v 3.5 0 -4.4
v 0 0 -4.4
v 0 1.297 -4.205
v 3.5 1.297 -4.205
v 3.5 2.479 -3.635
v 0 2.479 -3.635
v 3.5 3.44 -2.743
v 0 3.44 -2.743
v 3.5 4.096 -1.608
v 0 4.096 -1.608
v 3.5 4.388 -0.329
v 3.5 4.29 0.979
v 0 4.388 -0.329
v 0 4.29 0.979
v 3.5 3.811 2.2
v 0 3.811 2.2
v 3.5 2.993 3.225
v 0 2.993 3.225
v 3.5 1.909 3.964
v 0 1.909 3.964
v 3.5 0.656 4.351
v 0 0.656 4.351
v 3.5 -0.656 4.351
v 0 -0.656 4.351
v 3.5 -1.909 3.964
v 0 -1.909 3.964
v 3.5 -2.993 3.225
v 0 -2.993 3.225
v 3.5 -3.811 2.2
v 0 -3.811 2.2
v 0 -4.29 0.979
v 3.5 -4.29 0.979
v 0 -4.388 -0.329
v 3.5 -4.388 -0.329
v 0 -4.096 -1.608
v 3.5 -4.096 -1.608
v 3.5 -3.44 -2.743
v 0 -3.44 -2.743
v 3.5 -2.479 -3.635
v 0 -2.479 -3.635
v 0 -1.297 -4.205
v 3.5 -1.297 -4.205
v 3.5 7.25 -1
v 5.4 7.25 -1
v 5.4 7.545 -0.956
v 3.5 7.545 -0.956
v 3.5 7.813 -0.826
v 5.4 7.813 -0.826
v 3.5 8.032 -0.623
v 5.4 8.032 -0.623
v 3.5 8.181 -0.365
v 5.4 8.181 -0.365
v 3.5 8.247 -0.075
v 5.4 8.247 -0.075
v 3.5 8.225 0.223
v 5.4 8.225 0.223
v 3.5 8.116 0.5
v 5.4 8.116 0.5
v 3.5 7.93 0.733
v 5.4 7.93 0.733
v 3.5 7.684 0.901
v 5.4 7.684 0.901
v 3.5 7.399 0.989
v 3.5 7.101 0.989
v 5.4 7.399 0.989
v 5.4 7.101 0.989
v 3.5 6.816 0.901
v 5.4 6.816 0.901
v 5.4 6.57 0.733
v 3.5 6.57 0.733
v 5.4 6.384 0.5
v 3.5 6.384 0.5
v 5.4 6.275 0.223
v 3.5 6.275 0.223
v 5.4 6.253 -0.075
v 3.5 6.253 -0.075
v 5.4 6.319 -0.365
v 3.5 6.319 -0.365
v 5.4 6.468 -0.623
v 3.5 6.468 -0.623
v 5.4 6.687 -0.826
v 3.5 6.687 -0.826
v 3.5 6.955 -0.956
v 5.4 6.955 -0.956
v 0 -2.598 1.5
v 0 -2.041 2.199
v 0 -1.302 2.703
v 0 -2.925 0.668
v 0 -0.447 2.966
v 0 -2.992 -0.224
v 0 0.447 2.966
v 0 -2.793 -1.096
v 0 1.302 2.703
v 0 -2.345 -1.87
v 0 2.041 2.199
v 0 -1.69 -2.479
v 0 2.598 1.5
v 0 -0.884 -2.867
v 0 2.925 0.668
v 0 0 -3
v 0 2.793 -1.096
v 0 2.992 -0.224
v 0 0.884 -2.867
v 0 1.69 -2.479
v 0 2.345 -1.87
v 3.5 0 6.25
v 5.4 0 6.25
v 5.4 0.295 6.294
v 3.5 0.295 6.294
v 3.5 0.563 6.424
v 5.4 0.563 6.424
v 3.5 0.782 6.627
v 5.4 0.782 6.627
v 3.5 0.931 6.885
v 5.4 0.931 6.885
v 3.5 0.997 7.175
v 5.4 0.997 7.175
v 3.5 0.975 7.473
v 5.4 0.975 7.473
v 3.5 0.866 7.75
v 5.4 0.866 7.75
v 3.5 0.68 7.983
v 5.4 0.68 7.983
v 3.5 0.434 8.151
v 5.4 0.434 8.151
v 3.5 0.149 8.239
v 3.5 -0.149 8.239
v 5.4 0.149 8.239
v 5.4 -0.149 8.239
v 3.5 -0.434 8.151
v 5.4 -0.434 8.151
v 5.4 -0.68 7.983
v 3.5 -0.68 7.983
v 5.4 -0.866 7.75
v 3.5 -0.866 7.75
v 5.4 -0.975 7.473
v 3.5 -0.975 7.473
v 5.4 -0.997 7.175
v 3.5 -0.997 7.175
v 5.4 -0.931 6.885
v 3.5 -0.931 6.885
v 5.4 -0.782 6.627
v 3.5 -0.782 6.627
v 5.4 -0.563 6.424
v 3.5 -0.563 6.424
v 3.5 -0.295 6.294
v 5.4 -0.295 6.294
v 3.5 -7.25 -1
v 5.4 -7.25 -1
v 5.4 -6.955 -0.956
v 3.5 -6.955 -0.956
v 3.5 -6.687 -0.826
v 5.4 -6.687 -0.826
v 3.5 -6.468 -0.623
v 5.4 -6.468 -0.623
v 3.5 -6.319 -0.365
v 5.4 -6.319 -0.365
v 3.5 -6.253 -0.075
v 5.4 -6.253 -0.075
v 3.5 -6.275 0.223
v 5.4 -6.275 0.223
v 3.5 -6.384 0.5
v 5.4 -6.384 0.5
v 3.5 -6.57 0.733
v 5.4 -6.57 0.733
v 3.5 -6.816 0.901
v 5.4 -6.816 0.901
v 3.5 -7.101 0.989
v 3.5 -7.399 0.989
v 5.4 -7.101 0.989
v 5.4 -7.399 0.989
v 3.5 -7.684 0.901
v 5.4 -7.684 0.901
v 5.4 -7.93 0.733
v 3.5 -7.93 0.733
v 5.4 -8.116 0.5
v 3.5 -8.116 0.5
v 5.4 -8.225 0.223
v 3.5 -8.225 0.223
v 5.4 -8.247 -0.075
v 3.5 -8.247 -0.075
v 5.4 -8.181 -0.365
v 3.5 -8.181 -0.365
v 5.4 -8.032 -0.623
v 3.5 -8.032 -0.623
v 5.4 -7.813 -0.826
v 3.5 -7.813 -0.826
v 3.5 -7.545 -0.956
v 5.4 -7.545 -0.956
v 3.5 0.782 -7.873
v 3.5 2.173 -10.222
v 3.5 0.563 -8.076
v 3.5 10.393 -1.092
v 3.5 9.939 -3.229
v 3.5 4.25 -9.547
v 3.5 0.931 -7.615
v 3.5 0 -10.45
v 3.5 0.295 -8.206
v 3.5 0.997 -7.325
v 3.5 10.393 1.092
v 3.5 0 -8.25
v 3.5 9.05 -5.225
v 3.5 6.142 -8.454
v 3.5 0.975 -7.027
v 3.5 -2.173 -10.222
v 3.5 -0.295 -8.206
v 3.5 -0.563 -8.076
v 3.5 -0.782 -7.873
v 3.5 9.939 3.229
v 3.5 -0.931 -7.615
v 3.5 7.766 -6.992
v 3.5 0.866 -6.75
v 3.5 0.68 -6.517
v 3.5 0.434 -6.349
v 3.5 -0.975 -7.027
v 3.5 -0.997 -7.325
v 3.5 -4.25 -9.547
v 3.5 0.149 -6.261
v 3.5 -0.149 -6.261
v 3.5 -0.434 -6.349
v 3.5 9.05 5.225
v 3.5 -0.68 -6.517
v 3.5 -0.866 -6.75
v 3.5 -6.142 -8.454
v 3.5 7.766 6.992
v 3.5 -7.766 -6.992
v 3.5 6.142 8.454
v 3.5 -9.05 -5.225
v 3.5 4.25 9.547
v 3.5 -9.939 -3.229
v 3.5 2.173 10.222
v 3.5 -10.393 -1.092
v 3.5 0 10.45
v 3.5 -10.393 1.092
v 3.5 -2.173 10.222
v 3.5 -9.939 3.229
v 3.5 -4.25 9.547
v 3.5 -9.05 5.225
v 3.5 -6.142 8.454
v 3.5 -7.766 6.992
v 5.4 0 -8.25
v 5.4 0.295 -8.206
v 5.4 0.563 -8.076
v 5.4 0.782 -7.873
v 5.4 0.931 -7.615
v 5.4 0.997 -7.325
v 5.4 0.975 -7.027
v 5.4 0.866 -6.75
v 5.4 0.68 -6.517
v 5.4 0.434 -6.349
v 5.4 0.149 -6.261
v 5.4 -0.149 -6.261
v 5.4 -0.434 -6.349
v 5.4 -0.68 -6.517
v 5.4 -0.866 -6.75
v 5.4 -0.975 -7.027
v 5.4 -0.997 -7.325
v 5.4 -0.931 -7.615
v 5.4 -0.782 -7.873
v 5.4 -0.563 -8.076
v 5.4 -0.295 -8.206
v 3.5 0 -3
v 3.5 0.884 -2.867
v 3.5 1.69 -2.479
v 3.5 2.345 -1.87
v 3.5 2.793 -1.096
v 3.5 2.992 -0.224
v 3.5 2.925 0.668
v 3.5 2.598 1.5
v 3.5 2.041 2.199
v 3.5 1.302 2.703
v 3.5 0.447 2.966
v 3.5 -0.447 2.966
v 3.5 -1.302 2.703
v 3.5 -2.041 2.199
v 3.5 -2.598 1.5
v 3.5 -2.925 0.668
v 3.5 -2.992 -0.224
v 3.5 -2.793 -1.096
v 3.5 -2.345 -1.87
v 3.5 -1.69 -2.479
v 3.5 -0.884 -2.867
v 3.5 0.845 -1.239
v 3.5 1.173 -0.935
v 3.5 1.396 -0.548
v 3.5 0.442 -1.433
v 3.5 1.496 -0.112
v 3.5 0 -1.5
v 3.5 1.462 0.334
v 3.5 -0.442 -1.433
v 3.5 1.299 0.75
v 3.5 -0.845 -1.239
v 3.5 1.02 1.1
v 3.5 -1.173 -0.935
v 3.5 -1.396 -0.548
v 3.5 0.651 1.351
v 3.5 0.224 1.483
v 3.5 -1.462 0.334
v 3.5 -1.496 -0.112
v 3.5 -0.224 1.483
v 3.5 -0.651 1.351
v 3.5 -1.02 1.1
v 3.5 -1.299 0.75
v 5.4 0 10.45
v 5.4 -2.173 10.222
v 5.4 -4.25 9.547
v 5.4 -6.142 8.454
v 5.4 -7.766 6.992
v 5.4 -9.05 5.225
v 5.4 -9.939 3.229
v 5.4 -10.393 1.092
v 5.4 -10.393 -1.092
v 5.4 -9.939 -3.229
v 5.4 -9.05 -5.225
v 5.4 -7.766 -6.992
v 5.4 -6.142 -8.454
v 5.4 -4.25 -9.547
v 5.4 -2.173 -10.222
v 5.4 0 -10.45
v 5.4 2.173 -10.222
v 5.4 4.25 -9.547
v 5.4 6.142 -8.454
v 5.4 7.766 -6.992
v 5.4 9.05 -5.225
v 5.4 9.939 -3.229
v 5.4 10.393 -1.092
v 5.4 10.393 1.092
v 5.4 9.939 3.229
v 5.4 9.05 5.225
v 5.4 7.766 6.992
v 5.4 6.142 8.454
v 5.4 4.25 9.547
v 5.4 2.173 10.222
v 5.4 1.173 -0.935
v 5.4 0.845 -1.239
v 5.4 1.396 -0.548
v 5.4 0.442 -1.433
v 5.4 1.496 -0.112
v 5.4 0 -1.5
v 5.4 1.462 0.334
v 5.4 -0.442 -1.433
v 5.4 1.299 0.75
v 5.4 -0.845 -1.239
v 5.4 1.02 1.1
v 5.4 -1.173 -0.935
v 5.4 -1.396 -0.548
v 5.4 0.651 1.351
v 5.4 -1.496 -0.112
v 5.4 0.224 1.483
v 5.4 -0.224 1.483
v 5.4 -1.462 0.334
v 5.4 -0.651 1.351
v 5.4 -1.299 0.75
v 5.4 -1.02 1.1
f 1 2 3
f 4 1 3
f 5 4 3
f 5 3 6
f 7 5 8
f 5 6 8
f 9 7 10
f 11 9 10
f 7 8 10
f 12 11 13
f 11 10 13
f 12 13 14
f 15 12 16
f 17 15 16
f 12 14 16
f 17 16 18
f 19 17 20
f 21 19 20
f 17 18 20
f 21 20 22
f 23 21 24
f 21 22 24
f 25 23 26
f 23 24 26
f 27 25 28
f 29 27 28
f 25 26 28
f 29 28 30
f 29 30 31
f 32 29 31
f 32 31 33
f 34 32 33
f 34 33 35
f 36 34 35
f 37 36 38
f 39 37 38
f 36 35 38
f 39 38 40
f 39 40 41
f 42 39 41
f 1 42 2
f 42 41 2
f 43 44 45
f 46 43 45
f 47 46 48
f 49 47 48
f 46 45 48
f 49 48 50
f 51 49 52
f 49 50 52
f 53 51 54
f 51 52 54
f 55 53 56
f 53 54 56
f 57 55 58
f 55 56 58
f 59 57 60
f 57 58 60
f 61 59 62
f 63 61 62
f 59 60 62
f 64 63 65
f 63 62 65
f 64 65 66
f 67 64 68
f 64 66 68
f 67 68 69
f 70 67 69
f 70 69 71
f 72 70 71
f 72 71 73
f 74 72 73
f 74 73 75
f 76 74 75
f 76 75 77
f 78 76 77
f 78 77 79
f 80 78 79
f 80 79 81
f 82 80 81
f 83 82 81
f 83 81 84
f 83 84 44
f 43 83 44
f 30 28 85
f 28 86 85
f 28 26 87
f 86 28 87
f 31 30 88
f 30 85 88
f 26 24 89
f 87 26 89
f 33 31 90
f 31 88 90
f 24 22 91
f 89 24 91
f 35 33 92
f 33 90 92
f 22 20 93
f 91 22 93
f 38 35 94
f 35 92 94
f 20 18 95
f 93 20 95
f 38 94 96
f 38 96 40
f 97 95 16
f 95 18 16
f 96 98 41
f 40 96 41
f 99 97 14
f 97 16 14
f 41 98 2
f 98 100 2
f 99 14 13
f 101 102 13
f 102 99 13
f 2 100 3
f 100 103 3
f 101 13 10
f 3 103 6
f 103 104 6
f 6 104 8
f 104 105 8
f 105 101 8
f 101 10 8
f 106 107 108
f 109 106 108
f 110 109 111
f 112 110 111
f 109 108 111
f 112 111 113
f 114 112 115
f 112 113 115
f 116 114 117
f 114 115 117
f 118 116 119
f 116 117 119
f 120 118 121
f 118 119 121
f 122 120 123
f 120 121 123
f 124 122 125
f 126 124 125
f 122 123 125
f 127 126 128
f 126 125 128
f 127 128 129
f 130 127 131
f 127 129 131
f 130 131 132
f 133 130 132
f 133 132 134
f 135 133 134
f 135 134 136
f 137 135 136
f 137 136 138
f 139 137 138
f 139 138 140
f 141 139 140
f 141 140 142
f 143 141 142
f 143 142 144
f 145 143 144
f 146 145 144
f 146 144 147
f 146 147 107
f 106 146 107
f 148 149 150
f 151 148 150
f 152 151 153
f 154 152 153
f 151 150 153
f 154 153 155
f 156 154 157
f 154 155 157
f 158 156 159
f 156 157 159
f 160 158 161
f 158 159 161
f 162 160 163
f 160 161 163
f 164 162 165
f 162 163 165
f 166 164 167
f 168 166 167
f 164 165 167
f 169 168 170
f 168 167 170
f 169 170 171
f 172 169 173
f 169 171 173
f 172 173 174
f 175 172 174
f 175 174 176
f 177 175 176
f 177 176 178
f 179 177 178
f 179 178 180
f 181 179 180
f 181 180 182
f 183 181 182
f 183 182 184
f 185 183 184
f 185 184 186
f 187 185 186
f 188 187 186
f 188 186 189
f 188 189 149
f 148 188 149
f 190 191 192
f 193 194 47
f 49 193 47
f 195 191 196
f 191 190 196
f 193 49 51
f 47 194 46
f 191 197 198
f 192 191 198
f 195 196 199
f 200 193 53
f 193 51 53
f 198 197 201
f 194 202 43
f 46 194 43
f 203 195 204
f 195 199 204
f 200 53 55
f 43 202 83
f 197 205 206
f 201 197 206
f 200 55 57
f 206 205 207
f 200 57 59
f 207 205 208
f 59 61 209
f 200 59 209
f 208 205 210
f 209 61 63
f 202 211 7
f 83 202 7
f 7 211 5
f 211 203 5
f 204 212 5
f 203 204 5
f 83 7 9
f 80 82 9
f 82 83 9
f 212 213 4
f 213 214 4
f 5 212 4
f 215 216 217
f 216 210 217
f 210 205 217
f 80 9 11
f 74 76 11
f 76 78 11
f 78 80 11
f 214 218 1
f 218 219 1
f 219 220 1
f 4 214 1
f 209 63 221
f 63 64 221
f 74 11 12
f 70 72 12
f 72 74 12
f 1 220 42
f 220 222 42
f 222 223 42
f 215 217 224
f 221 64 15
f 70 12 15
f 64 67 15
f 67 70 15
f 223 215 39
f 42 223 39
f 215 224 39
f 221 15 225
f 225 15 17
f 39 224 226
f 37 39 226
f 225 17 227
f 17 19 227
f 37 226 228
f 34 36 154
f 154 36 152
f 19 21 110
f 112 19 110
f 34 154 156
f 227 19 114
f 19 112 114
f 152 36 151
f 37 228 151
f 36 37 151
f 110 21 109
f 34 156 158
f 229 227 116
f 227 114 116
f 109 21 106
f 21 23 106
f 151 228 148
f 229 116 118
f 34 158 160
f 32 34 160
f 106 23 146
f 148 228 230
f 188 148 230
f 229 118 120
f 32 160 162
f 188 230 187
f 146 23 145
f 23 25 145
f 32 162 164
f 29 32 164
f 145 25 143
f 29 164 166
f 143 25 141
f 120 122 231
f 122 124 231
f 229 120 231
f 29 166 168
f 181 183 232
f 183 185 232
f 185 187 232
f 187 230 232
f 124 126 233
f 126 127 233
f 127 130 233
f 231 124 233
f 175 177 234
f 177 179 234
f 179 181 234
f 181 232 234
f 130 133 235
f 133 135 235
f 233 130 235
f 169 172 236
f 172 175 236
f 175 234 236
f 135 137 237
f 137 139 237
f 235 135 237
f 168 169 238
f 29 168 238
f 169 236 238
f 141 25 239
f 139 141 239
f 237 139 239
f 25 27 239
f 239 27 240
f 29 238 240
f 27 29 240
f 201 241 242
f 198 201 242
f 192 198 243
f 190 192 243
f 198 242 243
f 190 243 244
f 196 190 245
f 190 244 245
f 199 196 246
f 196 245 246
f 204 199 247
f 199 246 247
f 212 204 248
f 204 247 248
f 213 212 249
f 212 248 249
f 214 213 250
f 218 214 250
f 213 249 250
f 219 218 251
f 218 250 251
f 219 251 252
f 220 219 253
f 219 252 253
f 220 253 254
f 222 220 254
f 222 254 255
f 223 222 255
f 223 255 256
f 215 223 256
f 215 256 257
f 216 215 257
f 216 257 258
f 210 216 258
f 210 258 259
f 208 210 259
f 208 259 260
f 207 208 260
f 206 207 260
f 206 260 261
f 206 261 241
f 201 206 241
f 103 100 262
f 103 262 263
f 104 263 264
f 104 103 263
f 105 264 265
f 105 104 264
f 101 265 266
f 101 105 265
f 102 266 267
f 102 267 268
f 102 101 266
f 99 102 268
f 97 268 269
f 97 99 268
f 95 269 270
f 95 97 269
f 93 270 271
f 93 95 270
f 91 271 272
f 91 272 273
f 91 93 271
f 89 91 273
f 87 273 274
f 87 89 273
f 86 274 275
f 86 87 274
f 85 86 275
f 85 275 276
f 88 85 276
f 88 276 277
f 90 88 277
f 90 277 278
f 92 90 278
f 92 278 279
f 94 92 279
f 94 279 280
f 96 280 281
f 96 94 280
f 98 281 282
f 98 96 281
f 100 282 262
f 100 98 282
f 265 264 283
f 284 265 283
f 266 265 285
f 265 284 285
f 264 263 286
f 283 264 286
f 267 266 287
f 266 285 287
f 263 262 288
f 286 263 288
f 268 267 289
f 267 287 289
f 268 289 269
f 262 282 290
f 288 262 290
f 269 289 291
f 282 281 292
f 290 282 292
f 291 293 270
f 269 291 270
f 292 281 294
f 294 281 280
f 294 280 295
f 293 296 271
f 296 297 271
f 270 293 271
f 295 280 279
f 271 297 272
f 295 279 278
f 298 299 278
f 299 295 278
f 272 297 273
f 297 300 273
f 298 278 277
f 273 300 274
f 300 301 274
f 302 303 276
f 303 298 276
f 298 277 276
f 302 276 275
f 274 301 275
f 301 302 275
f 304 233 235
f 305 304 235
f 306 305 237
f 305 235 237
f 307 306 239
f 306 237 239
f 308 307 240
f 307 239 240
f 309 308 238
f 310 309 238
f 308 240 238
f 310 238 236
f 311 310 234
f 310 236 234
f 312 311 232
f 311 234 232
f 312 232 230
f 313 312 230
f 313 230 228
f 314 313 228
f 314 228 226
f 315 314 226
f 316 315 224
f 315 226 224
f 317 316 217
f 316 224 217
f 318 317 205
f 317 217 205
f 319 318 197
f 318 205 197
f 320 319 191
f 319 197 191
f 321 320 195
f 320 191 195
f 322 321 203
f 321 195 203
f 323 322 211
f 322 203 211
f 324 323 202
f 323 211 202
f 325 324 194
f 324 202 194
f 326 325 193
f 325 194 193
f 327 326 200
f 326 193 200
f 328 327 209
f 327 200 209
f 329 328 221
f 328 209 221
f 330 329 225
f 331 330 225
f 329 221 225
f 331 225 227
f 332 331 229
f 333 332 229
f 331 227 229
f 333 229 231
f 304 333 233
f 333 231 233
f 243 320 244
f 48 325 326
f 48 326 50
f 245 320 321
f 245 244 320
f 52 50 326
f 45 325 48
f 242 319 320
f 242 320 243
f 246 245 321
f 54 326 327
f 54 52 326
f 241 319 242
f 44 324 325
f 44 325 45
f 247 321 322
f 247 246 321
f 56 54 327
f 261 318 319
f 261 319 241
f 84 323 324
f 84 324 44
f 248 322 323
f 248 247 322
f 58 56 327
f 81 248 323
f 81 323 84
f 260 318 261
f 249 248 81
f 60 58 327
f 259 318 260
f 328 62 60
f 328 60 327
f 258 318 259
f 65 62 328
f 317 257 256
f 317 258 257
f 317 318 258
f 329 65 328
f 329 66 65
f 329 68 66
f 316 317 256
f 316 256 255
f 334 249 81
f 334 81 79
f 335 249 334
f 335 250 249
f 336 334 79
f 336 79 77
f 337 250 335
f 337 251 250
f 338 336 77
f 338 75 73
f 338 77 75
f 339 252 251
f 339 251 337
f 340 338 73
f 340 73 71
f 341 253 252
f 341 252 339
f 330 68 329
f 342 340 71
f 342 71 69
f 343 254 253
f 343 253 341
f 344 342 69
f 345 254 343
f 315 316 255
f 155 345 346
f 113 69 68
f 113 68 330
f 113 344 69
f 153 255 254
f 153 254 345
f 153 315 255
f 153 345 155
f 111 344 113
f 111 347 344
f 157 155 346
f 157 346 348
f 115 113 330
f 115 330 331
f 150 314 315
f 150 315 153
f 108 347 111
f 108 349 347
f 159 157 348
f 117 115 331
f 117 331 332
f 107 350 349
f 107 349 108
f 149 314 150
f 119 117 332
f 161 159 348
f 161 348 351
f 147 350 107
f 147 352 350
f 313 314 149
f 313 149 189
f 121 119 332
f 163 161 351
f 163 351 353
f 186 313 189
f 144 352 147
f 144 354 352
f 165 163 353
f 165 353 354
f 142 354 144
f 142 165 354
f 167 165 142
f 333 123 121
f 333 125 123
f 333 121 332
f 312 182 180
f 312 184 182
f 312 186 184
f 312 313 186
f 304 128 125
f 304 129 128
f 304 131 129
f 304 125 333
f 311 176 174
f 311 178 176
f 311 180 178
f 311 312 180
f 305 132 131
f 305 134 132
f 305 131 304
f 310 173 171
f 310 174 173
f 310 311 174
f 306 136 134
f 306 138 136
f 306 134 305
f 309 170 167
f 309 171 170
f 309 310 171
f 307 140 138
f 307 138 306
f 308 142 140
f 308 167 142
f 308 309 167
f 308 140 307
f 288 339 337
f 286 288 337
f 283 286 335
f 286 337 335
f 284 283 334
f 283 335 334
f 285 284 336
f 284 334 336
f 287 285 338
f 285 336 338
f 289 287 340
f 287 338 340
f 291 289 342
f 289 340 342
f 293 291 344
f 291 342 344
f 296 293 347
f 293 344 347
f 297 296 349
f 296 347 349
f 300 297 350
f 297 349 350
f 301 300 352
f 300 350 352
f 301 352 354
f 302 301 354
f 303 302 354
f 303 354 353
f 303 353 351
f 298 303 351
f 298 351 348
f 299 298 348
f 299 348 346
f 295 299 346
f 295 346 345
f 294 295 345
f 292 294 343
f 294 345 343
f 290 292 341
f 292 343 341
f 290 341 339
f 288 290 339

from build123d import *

# Parameters (mm, degrees)
SKETCH1_R           = 4.4
SKETCH1_R_2         = 3
BOSS_EXTRUDE1_DEPTH = 3.5
SKETCH2_R           = 10.45
BOSS_EXTRUDE2_DEPTH = 1.9
SKETCH3_R           = 1.5
CUT_EXTRUDE1_DEPTH  = 1.9
SKETCH4_R           = 1
CUT_EXTRUDE2_DEPTH  = 5.4


with BuildPart() as part:
    # Sketch1 → Boss-Extrude1 (new body)
    with BuildSketch(Plane(origin=(0, 0, 0), x_dir=(0, 0, -1), z_dir=(1, 0, 0))):
        Circle(SKETCH1_R)
        Circle(SKETCH1_R_2, mode=Mode.SUBTRACT)
    extrude(amount=BOSS_EXTRUDE1_DEPTH)

    # Sketch2 → Boss-Extrude2 (add)
    with BuildSketch(Plane(origin=(3.5, 0, 0), x_dir=(0, 0, -1), z_dir=(1, 0, 0))):
        with Locations(Location((0, 0, 0), (0, 0, 180))):
            Circle(SKETCH2_R)
    extrude(amount=BOSS_EXTRUDE2_DEPTH)

    # Sketch3 → Cut-Extrude1 (cut)
    with BuildSketch(Plane(origin=(5.4, 0, 0), x_dir=(0, 0, -1), z_dir=(1, 0, 0))):
        Circle(SKETCH3_R)
    extrude(amount=-CUT_EXTRUDE1_DEPTH, mode=Mode.SUBTRACT)

    # Sketch4 → Cut-Extrude2 (cut)
    with BuildSketch(Plane(origin=(5.4, 0, 0), x_dir=(0, 0, -1), z_dir=(1, 0, 0))):
        with Locations((0, 7.25)):
            Circle(SKETCH4_R)
        with Locations((7.25, 0)):
            Circle(SKETCH4_R)
        with Locations((0, -7.25)):
            Circle(SKETCH4_R)
        with Locations((-7.25, 0)):
            Circle(SKETCH4_R)
    extrude(amount=-CUT_EXTRUDE2_DEPTH, mode=Mode.SUBTRACT)


solid = part.part
